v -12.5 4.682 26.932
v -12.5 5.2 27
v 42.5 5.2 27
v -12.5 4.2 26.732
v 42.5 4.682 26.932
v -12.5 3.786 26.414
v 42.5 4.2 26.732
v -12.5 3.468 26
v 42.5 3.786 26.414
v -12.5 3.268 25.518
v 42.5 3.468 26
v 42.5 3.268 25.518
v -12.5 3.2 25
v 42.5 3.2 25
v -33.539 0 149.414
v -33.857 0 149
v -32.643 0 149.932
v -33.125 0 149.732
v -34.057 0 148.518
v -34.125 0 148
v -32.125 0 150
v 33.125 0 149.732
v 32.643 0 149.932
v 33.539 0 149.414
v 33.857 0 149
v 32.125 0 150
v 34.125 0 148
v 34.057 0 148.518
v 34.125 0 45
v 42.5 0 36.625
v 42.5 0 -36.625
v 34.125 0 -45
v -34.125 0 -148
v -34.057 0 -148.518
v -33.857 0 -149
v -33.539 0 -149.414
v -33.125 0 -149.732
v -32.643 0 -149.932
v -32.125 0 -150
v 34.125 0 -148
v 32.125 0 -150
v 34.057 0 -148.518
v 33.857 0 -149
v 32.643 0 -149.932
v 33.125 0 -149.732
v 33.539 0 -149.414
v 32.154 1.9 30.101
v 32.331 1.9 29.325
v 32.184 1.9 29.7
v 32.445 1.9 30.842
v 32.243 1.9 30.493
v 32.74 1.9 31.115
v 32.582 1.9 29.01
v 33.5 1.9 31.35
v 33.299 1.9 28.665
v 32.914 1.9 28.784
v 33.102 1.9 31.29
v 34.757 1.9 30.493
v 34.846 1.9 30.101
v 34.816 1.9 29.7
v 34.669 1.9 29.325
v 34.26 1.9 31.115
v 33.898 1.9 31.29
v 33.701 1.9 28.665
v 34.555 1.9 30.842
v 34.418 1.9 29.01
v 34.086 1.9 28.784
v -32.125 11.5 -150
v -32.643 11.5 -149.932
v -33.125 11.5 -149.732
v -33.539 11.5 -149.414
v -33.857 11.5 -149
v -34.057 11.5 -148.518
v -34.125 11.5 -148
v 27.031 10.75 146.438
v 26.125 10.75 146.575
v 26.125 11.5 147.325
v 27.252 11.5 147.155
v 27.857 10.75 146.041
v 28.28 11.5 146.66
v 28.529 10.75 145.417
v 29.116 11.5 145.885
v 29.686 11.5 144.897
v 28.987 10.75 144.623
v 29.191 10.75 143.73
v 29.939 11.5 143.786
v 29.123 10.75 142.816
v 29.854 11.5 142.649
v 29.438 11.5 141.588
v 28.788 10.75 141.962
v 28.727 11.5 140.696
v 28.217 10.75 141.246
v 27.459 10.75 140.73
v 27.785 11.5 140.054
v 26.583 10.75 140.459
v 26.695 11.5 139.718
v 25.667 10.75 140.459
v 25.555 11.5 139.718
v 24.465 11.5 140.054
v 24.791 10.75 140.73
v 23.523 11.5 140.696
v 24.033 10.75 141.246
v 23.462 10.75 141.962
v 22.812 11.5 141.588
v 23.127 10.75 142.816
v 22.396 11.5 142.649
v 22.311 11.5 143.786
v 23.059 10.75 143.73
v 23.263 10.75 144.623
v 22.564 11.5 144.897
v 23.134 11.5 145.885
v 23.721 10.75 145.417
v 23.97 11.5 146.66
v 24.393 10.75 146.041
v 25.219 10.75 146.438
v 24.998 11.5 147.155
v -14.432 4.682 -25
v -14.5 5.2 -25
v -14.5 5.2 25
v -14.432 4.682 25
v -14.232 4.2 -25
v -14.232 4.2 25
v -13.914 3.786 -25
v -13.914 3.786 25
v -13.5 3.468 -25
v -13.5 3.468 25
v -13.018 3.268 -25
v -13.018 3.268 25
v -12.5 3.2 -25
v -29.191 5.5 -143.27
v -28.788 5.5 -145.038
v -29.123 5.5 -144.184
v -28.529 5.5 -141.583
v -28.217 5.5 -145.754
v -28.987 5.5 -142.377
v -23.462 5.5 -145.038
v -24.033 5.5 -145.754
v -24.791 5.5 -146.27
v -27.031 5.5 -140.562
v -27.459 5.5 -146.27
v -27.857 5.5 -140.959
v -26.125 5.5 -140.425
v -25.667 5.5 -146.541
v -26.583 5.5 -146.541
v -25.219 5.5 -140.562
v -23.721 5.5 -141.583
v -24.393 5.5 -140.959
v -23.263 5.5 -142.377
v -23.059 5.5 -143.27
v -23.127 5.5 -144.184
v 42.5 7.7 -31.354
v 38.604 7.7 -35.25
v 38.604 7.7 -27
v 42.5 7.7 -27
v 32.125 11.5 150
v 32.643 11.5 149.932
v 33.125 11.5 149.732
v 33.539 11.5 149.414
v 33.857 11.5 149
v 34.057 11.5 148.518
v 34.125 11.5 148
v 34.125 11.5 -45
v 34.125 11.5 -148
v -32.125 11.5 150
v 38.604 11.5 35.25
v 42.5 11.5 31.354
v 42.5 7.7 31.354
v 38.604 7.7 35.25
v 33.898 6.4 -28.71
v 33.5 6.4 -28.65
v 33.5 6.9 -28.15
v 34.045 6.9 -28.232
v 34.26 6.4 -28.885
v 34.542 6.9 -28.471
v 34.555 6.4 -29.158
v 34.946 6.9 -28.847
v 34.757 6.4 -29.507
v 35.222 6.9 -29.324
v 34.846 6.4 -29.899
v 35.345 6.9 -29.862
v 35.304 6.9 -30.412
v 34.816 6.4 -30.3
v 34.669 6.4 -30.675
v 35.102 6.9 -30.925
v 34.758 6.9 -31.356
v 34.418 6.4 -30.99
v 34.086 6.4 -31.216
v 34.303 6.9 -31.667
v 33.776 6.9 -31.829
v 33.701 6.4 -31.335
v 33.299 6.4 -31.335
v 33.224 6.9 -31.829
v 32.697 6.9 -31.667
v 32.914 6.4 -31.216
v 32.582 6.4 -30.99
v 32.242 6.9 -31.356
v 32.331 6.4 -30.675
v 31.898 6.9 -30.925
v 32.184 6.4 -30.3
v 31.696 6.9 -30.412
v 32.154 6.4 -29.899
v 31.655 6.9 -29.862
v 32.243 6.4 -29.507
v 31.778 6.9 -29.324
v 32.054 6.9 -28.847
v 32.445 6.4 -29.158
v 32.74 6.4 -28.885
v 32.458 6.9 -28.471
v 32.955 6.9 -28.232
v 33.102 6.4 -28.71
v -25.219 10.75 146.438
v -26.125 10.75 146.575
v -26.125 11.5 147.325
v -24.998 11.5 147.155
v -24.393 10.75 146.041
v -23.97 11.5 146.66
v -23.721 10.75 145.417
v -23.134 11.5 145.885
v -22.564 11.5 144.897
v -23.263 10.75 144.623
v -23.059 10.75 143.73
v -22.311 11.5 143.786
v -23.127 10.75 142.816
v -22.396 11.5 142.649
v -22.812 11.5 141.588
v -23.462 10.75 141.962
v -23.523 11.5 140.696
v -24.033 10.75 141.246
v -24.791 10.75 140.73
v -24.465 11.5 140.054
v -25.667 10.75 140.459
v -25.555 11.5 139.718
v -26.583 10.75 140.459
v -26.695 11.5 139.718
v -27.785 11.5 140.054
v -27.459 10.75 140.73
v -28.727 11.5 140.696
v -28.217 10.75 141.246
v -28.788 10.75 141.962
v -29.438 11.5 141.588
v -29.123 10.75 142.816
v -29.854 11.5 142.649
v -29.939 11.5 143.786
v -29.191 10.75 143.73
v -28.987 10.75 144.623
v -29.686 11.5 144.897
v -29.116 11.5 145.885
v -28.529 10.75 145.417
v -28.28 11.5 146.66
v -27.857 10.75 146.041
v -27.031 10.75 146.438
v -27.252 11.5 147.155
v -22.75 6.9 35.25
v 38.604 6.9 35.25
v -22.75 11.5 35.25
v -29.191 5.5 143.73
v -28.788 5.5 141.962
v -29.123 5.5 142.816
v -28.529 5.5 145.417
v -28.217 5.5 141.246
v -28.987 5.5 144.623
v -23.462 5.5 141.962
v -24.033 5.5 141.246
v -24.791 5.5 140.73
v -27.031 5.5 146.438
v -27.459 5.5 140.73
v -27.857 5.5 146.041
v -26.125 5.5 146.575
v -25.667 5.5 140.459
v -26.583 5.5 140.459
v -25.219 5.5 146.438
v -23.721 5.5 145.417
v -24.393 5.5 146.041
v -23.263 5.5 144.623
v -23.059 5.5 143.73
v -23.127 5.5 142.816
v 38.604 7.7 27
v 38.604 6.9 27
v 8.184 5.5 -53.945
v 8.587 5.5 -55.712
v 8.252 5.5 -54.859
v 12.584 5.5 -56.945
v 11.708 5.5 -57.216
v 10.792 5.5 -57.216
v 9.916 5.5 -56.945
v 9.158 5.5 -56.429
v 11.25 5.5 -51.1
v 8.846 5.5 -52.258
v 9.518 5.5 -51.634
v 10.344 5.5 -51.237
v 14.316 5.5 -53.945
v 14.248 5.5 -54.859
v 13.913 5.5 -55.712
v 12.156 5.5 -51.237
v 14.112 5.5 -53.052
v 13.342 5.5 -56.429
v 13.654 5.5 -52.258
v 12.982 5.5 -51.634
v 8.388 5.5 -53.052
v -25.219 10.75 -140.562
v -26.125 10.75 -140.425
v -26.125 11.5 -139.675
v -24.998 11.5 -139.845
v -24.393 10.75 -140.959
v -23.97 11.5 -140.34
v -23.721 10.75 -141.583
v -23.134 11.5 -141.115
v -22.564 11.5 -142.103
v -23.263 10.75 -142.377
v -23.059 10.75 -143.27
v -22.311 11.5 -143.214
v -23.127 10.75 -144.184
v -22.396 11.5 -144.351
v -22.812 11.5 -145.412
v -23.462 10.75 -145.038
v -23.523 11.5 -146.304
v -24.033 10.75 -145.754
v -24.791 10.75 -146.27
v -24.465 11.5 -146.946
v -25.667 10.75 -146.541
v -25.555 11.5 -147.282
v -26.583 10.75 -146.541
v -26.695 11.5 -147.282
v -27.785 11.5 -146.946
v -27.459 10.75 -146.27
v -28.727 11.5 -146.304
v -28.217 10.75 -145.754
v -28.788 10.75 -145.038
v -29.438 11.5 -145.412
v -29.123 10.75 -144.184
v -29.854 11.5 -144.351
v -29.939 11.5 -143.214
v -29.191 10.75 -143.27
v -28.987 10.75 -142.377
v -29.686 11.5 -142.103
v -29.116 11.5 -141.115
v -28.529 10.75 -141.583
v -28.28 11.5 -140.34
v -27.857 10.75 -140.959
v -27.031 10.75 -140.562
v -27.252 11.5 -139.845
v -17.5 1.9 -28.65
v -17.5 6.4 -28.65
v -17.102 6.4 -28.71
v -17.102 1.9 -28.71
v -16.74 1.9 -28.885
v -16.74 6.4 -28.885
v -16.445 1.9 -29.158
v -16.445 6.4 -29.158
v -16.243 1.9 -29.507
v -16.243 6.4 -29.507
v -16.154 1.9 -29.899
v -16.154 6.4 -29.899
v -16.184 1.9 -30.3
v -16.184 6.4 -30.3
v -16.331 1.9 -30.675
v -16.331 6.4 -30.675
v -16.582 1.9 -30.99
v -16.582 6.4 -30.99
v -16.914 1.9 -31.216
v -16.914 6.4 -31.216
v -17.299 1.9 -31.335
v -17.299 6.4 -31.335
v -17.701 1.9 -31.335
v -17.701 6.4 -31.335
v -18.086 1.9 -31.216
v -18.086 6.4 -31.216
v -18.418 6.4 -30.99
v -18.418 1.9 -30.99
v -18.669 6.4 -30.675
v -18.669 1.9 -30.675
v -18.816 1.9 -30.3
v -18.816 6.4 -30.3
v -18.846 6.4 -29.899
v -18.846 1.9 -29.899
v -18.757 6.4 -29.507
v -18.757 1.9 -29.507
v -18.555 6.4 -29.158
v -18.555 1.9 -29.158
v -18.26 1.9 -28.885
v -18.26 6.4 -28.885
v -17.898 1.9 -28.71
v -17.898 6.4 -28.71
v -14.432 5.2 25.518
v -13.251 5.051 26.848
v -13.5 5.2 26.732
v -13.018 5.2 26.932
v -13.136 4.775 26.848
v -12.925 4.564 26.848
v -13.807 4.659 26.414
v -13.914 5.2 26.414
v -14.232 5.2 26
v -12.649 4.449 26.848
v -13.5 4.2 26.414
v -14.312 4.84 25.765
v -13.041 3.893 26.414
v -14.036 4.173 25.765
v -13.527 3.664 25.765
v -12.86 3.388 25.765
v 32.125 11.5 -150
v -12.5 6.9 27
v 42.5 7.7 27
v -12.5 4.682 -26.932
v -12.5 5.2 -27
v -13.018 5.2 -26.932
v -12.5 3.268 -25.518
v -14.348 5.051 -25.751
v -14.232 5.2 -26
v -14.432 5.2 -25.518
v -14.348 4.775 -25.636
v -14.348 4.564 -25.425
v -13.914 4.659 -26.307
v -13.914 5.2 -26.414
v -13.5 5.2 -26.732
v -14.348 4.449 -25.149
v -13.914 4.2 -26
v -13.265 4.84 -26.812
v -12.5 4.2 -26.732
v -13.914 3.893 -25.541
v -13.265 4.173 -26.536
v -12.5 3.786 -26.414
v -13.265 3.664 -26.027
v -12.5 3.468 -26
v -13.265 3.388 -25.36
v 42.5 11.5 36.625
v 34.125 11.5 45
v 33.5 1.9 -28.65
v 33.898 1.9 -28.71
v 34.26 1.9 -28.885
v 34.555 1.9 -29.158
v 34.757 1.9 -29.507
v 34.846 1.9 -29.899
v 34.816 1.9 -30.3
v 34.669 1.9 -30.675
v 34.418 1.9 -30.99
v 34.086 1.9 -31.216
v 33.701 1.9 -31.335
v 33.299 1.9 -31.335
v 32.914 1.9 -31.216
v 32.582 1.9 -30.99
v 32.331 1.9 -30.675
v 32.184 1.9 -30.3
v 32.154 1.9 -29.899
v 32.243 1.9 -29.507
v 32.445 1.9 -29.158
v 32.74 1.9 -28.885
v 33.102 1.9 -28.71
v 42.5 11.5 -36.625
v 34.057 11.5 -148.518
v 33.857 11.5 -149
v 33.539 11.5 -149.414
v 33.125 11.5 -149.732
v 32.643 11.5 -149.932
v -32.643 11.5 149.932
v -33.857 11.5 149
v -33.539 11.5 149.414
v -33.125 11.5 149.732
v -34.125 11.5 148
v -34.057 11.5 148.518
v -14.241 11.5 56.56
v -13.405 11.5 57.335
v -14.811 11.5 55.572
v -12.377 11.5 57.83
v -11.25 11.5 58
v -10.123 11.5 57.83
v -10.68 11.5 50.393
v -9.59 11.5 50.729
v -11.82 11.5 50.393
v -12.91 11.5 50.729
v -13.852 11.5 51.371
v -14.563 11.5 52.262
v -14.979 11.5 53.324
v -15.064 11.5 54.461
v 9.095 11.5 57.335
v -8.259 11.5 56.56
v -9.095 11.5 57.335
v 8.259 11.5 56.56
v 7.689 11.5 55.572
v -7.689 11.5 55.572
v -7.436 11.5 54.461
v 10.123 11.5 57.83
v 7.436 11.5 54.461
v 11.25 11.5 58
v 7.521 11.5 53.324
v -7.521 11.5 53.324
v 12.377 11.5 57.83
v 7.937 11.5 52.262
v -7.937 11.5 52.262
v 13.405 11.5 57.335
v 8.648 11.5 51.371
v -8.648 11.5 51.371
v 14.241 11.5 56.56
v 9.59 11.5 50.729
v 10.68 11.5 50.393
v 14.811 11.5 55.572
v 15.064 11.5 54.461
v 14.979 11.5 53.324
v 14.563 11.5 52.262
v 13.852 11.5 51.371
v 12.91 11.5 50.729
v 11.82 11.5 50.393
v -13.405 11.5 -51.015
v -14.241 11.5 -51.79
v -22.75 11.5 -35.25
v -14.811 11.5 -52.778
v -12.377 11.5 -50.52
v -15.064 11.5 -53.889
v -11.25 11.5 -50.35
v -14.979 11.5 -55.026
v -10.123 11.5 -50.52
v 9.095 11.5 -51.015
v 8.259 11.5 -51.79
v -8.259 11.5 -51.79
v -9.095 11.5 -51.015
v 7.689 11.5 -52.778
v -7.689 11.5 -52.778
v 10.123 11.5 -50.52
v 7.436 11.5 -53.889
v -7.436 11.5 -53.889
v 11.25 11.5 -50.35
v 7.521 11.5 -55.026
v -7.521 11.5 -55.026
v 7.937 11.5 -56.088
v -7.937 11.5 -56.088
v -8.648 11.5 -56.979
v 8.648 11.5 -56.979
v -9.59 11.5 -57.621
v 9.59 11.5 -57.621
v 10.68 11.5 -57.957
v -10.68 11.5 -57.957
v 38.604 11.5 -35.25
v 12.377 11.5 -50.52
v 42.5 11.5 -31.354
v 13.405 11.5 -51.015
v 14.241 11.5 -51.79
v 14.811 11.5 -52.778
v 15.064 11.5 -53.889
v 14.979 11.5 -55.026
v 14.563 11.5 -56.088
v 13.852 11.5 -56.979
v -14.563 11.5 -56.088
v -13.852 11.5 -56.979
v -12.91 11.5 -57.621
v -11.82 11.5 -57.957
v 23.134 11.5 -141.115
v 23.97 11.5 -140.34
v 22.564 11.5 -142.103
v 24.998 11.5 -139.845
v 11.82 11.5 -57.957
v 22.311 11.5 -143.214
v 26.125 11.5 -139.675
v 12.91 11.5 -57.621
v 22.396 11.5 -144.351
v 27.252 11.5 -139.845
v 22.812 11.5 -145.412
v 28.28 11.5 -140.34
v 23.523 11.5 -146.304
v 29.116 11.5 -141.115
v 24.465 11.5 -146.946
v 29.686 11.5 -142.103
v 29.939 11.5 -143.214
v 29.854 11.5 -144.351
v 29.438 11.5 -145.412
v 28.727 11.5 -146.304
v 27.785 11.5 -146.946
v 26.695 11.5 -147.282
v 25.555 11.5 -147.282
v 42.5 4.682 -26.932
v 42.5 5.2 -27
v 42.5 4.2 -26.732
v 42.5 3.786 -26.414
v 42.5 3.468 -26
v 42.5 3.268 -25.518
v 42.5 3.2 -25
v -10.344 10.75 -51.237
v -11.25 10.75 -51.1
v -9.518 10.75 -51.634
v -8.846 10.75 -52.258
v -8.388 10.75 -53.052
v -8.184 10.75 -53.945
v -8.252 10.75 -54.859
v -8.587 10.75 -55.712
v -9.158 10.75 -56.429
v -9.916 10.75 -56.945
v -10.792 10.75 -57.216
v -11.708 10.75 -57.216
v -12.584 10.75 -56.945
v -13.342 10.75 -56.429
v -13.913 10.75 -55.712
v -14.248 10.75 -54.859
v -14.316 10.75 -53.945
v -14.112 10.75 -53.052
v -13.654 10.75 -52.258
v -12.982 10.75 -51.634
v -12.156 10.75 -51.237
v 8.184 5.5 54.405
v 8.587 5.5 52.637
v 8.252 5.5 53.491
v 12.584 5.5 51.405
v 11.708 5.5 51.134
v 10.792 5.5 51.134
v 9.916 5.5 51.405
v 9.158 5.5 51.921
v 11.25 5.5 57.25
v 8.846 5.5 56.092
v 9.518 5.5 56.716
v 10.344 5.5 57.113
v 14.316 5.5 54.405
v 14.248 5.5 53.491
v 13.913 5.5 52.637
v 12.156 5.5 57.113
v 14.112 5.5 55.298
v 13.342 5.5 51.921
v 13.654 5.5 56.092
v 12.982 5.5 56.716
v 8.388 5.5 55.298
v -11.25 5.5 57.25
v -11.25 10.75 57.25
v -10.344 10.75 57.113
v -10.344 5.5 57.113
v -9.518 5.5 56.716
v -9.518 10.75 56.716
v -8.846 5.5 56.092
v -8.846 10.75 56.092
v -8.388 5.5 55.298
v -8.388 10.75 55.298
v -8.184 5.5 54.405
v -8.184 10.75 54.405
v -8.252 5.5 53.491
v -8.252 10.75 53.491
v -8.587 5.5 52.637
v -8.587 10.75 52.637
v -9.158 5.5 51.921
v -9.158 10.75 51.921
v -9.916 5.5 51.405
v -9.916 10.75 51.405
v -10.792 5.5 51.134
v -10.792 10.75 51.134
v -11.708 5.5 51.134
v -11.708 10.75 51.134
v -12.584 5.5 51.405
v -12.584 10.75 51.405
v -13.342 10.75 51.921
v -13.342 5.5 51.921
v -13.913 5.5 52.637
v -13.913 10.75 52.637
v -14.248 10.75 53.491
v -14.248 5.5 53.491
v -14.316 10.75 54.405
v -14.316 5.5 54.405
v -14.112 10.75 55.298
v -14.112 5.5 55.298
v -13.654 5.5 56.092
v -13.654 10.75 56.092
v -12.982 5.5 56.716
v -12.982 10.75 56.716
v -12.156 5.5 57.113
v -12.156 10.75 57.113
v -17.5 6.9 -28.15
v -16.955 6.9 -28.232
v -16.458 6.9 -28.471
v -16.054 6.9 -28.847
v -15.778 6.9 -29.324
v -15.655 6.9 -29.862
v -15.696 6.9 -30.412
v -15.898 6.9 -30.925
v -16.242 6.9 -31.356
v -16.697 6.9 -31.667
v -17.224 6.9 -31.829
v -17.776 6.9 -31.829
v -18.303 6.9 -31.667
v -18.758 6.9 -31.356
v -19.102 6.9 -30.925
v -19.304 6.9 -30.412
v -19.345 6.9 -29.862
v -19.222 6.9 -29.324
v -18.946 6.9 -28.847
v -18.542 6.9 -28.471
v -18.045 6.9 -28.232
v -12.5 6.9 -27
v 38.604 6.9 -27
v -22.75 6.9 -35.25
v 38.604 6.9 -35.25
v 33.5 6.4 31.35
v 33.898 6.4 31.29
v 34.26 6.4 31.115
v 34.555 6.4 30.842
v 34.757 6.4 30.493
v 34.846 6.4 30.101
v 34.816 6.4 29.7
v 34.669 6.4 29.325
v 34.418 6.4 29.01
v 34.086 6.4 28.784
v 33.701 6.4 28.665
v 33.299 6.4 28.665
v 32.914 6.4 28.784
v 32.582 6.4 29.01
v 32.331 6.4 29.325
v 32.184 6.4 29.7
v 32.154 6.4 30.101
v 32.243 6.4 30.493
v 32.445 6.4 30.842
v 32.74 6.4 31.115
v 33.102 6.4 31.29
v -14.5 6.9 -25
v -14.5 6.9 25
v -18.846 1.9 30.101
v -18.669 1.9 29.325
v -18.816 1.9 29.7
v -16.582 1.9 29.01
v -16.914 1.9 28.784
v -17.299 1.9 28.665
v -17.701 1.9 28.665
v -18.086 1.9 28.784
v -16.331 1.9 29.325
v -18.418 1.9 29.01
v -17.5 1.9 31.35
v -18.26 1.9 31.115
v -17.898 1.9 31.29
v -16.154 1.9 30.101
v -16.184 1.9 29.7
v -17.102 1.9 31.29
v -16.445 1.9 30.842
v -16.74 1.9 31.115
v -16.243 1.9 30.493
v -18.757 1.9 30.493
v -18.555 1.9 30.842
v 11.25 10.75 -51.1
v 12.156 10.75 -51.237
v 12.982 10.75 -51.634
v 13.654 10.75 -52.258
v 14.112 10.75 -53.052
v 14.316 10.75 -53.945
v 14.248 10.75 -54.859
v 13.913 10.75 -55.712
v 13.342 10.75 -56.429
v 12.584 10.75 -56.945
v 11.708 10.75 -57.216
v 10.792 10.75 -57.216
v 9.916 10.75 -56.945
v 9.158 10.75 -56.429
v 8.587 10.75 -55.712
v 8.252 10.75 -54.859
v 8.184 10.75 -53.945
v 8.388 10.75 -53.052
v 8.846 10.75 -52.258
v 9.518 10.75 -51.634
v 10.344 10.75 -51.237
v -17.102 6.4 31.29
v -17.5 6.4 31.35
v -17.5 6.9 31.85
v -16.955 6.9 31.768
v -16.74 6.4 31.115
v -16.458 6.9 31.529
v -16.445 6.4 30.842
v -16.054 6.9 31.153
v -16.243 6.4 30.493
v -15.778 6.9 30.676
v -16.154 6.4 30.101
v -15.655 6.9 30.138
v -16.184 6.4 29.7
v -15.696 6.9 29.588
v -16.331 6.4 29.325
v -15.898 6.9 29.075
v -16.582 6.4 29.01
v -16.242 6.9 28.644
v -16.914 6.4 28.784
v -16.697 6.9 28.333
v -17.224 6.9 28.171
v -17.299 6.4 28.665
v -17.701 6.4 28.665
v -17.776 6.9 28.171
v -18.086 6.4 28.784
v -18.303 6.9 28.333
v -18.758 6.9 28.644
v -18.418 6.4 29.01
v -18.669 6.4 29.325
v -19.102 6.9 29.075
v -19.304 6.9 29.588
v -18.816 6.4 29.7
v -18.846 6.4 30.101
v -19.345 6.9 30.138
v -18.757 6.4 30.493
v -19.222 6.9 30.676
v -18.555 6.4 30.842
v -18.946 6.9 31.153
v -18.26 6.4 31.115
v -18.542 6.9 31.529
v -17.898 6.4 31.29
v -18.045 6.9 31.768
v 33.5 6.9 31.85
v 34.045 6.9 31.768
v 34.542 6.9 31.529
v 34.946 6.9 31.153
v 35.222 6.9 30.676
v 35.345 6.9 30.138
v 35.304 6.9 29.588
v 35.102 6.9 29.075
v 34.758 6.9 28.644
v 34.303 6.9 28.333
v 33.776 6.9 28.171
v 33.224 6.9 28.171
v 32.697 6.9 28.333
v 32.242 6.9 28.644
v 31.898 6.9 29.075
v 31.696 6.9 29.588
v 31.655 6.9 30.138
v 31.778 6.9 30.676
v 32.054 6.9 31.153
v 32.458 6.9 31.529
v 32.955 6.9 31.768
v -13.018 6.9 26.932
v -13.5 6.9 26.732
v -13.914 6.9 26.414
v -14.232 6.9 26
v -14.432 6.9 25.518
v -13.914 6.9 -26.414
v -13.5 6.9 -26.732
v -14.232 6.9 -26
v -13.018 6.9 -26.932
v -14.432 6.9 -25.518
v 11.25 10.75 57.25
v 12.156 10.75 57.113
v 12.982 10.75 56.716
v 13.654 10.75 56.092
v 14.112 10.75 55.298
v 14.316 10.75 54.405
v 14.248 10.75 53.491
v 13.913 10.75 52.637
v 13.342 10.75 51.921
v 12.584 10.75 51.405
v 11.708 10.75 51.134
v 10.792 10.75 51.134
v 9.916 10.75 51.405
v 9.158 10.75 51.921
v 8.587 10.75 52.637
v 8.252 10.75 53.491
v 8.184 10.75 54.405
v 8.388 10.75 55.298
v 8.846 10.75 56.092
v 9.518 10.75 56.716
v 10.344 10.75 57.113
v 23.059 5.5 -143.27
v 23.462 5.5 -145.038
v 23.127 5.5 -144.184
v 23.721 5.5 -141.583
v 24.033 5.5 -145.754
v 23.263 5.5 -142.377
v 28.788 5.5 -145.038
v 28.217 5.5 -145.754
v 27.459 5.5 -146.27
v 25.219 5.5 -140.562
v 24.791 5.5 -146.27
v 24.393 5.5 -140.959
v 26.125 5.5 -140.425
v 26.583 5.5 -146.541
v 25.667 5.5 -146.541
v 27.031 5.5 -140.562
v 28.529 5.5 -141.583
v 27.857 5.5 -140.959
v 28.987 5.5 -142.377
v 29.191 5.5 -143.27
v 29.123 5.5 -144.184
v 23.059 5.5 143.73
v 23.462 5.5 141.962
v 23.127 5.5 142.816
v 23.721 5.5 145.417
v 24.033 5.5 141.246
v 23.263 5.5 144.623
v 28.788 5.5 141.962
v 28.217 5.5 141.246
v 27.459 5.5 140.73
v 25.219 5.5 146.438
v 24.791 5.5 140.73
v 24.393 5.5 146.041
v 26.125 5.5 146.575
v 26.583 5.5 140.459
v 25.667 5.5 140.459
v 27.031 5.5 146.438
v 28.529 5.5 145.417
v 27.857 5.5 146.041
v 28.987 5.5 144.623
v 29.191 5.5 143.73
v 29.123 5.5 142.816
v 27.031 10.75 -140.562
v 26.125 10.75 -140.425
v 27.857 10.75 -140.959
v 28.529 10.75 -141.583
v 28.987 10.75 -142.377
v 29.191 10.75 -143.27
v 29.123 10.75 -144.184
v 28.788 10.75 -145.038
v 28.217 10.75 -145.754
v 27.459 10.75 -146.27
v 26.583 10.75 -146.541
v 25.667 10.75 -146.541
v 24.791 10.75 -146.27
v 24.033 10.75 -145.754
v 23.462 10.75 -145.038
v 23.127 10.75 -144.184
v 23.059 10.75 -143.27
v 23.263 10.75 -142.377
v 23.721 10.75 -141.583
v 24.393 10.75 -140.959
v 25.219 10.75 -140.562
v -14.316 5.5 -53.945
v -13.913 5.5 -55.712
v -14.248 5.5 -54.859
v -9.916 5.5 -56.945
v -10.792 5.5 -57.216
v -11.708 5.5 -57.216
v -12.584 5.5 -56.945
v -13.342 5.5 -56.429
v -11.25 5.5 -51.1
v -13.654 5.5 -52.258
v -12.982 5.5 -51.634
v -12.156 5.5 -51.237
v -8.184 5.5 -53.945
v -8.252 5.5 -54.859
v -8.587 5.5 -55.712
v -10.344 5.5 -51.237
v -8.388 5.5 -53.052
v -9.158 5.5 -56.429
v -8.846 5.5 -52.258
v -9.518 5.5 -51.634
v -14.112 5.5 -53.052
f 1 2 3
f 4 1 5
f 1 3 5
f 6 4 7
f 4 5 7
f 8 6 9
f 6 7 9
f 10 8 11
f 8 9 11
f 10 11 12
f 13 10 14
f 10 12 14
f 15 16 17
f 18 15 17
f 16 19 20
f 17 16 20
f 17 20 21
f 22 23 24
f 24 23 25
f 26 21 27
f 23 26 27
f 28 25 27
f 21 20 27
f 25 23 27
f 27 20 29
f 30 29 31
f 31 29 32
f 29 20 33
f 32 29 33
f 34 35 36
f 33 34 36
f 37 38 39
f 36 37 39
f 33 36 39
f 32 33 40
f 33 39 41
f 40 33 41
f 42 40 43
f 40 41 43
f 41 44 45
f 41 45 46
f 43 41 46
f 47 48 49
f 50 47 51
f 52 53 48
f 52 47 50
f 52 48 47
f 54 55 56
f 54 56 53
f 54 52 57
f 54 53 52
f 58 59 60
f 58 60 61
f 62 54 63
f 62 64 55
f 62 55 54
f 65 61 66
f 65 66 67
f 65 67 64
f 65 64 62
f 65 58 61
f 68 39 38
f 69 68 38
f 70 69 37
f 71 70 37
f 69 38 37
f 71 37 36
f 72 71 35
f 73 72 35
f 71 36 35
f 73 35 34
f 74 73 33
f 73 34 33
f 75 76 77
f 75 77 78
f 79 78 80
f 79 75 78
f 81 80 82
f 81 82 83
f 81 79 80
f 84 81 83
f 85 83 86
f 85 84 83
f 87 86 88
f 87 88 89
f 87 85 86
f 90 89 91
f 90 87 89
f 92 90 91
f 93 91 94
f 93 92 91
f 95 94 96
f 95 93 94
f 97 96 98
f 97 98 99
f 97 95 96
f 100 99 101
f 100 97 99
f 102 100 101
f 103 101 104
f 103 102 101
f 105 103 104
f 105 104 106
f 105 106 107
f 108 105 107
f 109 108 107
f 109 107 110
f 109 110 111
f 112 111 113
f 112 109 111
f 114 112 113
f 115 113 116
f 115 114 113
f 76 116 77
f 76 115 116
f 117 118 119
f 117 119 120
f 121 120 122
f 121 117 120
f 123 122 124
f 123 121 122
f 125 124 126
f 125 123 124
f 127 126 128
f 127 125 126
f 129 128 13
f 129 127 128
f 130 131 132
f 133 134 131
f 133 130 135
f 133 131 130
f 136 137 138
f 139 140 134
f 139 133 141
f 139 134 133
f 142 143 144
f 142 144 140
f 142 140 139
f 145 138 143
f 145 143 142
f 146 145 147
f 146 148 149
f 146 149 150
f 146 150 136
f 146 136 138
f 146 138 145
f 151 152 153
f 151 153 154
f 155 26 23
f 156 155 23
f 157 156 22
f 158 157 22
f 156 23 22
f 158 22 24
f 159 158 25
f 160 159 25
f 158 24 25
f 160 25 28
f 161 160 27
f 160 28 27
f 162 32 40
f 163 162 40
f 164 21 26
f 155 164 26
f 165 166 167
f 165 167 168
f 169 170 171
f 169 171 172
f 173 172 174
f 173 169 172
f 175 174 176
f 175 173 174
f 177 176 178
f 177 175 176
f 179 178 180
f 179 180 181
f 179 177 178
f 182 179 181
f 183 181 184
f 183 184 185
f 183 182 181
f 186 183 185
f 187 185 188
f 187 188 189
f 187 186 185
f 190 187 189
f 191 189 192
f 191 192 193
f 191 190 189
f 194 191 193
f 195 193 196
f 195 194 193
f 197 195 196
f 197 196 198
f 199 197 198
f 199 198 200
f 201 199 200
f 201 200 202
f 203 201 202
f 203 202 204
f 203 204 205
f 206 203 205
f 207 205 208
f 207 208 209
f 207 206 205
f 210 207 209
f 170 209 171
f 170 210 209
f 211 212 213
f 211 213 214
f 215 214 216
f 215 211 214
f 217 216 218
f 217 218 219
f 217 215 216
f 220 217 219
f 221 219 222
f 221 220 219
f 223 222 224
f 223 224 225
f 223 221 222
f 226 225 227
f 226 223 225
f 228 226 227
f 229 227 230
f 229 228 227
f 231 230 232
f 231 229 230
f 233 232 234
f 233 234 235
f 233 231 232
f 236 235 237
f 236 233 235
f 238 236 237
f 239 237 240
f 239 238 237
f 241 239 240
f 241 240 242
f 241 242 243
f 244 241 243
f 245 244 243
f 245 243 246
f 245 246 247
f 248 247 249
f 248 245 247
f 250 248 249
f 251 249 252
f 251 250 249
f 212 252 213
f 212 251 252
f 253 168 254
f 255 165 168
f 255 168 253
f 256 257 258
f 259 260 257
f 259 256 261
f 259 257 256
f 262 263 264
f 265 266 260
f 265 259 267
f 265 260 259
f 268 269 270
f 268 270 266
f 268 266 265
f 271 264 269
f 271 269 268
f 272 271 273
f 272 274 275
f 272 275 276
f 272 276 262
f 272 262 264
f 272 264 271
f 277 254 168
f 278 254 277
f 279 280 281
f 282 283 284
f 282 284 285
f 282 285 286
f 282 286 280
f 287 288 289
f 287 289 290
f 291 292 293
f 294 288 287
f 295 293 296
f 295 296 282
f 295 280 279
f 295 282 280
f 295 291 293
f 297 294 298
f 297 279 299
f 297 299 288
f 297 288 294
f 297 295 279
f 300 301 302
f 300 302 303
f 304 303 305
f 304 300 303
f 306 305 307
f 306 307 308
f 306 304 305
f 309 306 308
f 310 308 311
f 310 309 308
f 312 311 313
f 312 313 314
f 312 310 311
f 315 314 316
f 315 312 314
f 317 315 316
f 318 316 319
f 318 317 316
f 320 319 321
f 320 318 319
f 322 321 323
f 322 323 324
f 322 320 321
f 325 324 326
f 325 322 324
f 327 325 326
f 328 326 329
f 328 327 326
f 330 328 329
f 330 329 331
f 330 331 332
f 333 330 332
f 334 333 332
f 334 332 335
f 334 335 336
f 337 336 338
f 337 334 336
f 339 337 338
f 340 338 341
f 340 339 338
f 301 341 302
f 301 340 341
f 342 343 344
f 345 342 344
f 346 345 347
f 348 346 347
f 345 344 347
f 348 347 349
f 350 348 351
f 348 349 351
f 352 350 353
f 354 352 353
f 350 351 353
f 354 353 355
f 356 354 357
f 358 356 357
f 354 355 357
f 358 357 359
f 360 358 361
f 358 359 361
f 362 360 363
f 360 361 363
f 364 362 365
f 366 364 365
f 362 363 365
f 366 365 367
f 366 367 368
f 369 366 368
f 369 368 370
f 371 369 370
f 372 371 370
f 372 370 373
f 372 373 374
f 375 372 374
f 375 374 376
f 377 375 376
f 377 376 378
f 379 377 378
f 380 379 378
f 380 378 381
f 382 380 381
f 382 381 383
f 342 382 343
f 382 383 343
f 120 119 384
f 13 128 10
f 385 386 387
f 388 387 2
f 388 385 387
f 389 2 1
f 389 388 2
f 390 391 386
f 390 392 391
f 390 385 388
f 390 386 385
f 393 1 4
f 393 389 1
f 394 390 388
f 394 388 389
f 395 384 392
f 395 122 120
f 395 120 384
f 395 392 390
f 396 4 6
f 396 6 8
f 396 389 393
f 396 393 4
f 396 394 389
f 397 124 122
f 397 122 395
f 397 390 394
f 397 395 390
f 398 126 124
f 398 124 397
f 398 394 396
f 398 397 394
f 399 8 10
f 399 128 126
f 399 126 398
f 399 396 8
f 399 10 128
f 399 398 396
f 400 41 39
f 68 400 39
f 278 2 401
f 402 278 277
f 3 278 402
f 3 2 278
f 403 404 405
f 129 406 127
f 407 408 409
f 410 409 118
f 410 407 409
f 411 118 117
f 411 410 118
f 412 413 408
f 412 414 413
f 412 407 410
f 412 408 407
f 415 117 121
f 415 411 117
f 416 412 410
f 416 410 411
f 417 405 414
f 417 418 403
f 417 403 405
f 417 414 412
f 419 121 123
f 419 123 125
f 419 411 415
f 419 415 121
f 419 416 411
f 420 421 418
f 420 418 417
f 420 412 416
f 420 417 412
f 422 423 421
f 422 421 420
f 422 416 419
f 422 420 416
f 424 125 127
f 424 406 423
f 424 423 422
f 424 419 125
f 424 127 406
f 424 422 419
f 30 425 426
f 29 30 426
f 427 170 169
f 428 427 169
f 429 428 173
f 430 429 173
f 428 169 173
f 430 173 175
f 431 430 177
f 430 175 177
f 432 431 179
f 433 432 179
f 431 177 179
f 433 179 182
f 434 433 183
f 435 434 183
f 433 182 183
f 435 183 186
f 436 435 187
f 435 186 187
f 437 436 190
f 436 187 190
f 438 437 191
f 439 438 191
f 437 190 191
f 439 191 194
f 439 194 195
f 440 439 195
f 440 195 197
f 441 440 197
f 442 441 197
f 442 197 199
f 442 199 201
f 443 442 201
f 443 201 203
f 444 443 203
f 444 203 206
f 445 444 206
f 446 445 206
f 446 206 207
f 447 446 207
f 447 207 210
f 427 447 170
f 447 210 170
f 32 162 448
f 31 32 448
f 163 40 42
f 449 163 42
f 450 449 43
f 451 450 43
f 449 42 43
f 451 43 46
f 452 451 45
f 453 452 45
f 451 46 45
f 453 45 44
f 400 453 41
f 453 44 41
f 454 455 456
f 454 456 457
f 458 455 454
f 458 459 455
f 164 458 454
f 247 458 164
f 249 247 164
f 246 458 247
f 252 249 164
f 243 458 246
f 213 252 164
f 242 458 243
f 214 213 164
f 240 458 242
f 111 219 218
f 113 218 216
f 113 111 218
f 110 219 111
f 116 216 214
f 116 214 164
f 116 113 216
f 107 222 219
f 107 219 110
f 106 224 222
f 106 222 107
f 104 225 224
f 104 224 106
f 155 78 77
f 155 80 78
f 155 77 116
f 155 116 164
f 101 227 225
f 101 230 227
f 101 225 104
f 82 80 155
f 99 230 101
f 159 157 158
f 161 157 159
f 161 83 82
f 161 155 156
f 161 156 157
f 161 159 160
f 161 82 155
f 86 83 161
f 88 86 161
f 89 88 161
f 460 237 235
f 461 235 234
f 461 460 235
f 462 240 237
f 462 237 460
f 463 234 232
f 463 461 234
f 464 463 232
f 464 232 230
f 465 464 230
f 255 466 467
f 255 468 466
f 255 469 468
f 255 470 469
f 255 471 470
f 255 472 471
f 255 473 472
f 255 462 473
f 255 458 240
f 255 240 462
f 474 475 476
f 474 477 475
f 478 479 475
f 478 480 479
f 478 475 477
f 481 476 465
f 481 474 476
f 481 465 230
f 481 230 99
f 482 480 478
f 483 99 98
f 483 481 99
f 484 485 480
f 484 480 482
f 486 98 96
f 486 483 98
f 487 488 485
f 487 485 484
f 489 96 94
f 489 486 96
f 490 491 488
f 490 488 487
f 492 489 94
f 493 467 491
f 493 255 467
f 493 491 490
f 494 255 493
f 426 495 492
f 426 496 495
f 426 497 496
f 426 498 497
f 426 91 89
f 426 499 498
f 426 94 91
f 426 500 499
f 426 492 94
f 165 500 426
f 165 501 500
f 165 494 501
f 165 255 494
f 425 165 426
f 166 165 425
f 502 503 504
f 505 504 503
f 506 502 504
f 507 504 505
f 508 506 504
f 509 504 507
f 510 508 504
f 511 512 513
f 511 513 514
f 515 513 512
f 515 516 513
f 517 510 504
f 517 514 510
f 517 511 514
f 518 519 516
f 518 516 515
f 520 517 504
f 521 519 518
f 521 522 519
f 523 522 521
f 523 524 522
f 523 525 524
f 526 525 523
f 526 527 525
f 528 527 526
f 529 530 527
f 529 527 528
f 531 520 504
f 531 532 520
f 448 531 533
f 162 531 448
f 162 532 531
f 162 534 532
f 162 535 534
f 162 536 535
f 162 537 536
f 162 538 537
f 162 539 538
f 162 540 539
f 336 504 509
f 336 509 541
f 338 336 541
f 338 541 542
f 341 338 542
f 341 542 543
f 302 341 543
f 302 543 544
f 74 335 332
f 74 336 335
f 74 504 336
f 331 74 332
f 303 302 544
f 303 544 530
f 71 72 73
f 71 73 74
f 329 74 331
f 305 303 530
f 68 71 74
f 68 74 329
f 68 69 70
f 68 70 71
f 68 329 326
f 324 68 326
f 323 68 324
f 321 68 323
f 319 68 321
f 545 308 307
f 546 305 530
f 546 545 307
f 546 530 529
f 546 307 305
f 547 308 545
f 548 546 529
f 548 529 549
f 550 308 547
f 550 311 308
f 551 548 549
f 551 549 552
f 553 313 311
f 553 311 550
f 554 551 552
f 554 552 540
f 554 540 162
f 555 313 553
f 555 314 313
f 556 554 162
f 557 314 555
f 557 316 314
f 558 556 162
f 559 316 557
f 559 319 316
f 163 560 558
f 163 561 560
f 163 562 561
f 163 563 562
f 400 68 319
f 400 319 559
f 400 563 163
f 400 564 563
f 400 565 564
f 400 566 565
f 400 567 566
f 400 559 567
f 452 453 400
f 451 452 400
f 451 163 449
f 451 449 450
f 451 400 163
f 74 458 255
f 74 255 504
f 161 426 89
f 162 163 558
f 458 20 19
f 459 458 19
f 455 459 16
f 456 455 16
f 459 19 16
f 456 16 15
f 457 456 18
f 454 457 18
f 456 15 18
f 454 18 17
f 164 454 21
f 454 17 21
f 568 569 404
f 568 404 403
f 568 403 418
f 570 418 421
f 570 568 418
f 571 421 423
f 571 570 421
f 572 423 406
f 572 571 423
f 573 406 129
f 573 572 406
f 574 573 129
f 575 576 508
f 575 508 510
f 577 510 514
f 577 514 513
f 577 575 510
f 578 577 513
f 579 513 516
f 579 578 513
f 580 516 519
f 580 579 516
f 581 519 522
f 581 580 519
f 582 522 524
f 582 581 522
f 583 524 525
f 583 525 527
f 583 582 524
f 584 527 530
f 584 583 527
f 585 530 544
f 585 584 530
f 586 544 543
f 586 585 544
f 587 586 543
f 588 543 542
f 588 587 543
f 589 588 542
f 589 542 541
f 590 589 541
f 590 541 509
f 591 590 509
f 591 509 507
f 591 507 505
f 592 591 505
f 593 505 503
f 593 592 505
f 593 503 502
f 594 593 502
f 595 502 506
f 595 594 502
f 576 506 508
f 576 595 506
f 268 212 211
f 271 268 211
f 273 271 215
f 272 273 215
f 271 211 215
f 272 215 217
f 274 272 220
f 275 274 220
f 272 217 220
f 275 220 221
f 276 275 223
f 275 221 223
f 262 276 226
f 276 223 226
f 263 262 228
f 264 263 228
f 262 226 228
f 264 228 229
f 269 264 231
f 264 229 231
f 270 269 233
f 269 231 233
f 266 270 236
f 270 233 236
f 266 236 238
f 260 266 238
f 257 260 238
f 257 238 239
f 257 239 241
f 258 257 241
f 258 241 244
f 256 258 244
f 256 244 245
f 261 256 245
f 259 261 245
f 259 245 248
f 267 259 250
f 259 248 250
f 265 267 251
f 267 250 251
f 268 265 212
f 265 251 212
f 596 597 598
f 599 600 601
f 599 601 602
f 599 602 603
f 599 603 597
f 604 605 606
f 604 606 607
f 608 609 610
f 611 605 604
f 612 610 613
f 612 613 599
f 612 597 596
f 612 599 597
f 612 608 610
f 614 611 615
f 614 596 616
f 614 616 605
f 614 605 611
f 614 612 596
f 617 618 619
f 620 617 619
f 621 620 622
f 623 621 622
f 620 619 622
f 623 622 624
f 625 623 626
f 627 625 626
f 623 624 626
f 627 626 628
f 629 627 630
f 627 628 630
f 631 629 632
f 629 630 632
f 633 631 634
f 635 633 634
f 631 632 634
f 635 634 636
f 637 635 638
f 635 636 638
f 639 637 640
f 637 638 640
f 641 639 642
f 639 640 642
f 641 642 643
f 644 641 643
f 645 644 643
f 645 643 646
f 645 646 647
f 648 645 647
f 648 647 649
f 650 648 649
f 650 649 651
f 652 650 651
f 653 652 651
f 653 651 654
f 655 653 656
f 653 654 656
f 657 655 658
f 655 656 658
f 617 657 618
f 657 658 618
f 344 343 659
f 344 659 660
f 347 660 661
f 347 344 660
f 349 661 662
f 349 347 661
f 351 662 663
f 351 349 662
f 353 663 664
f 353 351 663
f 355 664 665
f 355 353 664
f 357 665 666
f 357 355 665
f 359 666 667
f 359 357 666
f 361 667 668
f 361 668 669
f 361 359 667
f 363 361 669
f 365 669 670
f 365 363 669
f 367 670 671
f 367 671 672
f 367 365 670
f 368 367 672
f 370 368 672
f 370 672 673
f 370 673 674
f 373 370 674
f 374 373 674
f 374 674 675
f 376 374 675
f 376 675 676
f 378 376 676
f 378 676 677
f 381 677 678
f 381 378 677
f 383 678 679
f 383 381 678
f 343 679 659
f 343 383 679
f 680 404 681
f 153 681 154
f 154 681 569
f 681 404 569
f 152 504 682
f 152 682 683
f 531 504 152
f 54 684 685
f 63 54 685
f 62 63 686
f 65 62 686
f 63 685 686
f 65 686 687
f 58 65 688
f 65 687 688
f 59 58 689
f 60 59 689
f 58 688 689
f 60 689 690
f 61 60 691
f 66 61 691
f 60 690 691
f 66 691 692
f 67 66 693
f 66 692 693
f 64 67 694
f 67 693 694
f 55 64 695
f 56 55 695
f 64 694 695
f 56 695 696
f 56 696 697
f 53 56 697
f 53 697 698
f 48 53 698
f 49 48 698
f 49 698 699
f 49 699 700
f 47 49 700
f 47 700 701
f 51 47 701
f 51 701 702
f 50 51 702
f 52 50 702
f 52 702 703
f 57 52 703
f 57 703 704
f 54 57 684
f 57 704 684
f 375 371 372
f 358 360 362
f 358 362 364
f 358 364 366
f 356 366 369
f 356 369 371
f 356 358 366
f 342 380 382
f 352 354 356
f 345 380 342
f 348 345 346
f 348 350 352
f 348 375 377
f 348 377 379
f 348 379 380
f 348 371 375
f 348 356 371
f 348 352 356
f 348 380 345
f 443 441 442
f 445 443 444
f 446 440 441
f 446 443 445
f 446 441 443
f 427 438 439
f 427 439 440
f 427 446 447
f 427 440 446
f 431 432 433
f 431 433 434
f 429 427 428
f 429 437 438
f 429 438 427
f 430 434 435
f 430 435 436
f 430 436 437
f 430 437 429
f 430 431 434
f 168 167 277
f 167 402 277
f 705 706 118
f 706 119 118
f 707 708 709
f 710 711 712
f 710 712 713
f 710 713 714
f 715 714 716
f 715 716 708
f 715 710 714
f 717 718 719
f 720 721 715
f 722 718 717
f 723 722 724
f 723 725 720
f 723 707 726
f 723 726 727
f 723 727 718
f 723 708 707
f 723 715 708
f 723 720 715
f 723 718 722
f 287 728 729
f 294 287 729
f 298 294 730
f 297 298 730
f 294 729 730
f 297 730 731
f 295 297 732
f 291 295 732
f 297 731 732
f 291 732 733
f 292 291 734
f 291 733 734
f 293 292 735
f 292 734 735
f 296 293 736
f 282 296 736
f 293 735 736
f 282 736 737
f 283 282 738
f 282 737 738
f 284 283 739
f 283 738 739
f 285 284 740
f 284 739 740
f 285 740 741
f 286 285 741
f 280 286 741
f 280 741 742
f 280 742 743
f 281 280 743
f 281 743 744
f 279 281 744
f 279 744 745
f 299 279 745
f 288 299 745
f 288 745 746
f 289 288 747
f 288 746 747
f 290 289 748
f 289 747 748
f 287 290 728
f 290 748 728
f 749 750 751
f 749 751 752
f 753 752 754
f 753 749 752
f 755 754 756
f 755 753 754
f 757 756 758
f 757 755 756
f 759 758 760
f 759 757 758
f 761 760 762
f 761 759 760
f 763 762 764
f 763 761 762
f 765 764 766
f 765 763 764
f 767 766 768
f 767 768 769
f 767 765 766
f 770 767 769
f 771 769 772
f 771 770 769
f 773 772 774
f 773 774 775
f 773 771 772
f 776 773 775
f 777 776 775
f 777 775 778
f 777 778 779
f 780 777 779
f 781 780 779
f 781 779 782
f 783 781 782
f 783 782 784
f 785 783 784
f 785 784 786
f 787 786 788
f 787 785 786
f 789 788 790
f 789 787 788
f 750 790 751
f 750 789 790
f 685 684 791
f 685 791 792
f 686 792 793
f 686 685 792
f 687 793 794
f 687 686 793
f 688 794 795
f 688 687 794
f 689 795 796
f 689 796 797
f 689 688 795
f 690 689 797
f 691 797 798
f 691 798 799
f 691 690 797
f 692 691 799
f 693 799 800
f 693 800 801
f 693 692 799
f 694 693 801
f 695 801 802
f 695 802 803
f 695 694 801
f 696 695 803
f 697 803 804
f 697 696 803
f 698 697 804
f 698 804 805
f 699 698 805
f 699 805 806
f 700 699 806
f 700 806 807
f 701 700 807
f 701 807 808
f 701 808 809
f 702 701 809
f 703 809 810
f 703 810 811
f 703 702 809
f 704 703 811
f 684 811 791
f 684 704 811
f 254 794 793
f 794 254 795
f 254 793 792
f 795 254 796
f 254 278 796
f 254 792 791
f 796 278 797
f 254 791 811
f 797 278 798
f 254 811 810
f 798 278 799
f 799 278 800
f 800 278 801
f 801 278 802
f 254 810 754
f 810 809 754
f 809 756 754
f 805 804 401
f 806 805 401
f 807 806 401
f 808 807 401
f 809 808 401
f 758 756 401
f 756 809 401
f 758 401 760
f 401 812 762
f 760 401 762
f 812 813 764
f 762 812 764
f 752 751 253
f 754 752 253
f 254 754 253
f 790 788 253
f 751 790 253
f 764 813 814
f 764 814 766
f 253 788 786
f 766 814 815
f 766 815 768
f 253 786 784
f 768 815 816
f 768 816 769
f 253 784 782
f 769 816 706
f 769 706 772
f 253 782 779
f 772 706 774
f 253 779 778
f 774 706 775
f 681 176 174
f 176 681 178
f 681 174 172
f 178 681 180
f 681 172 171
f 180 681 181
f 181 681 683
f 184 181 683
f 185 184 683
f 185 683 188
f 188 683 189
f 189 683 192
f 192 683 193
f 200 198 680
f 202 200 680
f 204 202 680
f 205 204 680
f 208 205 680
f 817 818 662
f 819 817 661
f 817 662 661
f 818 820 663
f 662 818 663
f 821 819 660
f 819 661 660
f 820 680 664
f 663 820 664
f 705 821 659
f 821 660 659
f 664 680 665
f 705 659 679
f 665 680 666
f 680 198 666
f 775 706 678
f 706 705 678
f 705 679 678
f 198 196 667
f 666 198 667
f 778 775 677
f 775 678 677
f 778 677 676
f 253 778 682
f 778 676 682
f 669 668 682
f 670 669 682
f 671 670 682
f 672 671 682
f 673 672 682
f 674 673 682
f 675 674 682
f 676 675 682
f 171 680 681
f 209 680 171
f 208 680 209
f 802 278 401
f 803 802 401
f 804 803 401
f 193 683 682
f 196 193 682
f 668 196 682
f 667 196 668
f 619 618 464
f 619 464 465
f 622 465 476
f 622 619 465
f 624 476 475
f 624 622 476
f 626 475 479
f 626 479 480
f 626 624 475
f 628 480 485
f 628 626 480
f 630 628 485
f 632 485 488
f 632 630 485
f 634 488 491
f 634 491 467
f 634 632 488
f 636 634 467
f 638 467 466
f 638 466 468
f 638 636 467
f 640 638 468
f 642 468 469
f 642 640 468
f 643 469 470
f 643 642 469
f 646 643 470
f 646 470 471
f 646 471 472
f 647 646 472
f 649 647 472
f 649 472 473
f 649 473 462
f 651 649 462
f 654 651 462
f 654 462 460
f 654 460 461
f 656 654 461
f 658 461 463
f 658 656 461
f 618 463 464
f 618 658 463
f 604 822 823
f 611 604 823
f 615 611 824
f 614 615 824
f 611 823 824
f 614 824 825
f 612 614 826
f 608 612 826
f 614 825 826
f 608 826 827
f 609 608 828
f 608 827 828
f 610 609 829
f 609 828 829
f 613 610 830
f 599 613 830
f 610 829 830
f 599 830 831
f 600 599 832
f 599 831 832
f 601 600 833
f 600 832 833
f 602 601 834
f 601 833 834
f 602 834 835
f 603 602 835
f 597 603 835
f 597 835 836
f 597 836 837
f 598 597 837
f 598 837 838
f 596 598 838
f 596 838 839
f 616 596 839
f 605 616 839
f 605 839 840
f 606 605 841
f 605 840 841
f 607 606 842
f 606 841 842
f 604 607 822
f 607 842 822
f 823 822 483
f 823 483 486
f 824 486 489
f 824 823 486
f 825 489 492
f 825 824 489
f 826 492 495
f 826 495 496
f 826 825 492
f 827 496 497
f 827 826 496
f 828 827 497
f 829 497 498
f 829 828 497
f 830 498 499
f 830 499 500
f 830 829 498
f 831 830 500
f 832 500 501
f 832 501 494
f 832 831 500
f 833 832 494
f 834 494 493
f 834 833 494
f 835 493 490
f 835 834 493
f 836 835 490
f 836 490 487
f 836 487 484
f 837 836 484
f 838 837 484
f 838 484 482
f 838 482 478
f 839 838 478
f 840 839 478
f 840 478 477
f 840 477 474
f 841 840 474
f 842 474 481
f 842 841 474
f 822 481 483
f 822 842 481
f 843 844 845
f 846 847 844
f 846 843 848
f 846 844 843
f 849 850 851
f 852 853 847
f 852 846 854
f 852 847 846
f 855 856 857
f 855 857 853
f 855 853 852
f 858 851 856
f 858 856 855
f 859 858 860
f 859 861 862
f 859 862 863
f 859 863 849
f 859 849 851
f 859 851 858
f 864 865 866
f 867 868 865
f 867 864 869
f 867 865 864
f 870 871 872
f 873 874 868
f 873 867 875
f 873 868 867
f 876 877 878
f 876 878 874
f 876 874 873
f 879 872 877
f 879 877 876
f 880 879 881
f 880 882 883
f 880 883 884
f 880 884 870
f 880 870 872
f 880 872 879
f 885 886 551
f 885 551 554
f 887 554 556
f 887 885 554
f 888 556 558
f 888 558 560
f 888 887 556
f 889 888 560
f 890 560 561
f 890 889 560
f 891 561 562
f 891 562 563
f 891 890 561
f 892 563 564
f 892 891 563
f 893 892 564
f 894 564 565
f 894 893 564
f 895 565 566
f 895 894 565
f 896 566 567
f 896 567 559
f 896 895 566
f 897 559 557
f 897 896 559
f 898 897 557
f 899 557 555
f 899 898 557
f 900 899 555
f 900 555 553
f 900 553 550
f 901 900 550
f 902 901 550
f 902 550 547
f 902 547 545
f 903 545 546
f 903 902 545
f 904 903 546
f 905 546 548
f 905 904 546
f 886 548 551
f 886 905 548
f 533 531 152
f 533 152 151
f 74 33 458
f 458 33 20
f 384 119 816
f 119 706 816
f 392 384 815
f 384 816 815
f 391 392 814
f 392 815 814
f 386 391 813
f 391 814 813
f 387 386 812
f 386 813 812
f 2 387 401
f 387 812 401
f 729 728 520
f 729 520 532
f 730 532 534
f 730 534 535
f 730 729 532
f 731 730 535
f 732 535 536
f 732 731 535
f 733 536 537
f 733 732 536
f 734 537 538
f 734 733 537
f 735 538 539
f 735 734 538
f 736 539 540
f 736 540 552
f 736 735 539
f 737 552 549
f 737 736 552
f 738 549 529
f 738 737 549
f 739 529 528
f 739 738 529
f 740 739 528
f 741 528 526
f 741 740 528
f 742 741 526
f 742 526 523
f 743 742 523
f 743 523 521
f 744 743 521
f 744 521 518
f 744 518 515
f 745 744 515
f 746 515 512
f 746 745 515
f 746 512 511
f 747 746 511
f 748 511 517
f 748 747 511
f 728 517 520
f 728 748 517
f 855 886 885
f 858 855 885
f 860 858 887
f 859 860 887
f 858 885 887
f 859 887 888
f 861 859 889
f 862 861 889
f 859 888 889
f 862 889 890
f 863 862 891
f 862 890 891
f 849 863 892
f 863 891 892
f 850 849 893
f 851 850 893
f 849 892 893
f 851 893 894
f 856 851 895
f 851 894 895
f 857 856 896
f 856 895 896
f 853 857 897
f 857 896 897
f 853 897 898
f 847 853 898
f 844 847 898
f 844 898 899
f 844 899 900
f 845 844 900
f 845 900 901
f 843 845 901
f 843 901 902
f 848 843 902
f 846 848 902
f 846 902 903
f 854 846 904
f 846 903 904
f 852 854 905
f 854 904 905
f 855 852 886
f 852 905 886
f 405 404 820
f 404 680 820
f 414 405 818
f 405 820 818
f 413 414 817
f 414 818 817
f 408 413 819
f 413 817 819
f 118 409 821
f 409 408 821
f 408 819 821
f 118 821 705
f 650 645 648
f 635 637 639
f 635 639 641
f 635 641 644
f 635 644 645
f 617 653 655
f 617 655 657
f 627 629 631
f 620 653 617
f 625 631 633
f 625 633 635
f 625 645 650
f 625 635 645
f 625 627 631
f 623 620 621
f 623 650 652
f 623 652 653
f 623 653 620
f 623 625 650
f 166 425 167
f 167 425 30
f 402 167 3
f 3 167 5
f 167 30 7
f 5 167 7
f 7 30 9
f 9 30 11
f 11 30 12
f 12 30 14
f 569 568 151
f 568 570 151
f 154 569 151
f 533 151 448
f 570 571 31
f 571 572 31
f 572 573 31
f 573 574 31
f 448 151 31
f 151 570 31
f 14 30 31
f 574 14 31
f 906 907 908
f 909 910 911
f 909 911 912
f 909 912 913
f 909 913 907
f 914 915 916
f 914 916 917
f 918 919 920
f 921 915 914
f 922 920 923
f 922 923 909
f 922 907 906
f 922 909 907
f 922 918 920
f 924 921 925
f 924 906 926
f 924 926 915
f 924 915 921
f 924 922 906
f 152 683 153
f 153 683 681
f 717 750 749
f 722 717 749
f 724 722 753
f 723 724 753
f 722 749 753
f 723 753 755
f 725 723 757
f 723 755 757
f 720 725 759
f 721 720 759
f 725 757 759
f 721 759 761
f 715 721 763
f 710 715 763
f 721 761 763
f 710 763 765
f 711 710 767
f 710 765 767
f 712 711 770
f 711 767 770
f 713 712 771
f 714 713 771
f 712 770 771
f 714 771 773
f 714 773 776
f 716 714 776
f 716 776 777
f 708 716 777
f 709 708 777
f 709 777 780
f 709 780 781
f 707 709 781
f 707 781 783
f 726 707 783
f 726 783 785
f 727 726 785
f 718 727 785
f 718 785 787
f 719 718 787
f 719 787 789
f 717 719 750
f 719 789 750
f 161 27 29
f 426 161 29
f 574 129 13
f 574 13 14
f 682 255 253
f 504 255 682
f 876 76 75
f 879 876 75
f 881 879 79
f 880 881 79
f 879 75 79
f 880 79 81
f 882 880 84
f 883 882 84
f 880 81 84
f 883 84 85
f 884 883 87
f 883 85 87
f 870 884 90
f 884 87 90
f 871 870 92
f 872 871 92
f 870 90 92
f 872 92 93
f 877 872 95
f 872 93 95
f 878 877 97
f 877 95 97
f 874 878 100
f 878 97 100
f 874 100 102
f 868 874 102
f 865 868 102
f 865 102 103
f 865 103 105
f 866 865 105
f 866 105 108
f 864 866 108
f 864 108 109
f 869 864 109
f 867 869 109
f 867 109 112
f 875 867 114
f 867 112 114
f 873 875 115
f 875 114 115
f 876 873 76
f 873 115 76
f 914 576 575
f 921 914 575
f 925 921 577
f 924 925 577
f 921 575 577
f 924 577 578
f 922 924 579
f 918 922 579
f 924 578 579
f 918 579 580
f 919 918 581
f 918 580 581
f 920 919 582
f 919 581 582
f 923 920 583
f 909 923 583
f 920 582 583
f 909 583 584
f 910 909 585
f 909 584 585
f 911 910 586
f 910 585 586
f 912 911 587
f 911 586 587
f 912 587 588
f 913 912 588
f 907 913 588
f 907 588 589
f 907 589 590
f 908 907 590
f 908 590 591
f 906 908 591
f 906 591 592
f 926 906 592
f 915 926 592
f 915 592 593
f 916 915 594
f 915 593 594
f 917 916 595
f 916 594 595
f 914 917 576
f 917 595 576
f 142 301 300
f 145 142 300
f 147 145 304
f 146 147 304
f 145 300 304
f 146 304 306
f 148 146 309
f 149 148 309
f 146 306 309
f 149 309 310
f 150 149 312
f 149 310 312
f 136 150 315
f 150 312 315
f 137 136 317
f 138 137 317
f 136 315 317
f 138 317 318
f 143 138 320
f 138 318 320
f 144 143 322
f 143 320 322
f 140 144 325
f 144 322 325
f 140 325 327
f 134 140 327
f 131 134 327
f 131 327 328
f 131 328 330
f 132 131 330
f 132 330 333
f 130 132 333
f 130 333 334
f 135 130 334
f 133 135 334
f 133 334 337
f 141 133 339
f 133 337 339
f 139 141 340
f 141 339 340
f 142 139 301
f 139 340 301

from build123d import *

# Parameters (mm, degrees)
BOSS_EXTRUDE1_DEPTH     = 11.5
SKETCH4_R               = 3.075
CUT_EXTRUDE1_DEPTH      = 6
BOSS_EXTRUDE3_DEPTH     = 11.5
CUT_EXTRUDE6_DEPTH      = 4.6
CUT_EXTRUDE3_DEPTH      = 157.057233091
CUT_EXTRUDE3_DEPTH_BACK = 3.7
SKETCH24_W              = 57
SKETCH24_H              = 54
SKETCH25_R              = 1.35
CUT_EXTRUDE4_DEPTH      = 5
CHAMFER4_SIZE           = 0.5
FILLET1_R               = 2
BOSS_EXTRUDE2_DEPTH     = 0.8
CHAMFER5_SIZE           = 0.75


with BuildPart() as part:
    # Sketch1 → Boss-Extrude1 (new body)
    with BuildSketch(Plane(origin=(0, 0, 0), x_dir=(1, 0, 0), z_dir=(0, 1, 0))):
        with BuildLine():
            Line((-34.125, 135), (-34.125, -135))
            Line((-34.125, -135), (-34.125, -148))
            ThreePointArc((-34.125, -148), (-33.539213562, -149.414213562), (-32.125, -150))
            Line((-32.125, -150), (32.125, -150))
            ThreePointArc((32.125, -150), (33.539213562, -149.414213562), (34.125, -148))
            Line((34.125, -148), (34.125, -135))
            Line((34.125, -135), (34.125, 135))
            Line((34.125, 135), (34.125, 148))
            ThreePointArc((34.125, 148), (33.539213562, 149.414213562), (32.125, 150))
            Line((32.125, 150), (-32.125, 150))
            ThreePointArc((-32.125, 150), (-33.539213562, 149.414213562), (-34.125, 148))
            Line((-34.125, 148), (-34.125, 135))
        make_face()
    extrude(amount=BOSS_EXTRUDE1_DEPTH)

    # Sketch4 → Cut-Extrude1 (cut)
    with BuildSketch(Plane(origin=(0, 11.5, 0), x_dir=(1, 0, 0), z_dir=(0, 1, 0))):
        with Locations(Location((-26.125, -143.5, 0), (0, 0, 270))):
            Circle(SKETCH4_R)
        with Locations(Location((26.125, -143.5, 0), (0, 0, 270))):
            Circle(SKETCH4_R)
        with Locations(Location((26.125, 143.5, 0), (0, 0, 270))):
            Circle(SKETCH4_R)
        with Locations(Location((-26.125, 143.5, 0), (0, 0, 270))):
            Circle(SKETCH4_R)
        with Locations(Location((-11.25, -54.175, 0), (0, 0, 270))):
            Circle(SKETCH4_R)
        with Locations(Location((11.25, -54.175, 0), (0, 0, 270))):
            Circle(SKETCH4_R)
        with Locations(Location((11.25, 54.175, 0), (0, 0, 270))):
            Circle(SKETCH4_R)
        with Locations(Location((-11.25, 54.175, 0), (0, 0, 270))):
            Circle(SKETCH4_R)
    extrude(amount=-CUT_EXTRUDE1_DEPTH, mode=Mode.SUBTRACT)

    # Sketch27 → Boss-Extrude3 (add)
    with BuildSketch(Plane(origin=(0, 11.5, 0), x_dir=(1, 0, 0), z_dir=(0, 1, 0))):
        Polygon((34.125, 45), (42.5, 36.625), (42.5, -36.625), (34.125, -45), align=None)
    extrude(amount=-BOSS_EXTRUDE3_DEPTH)

    # Sketch21 → Cut-Extrude6 (cut)
    with BuildSketch(Plane(origin=(0, 11.5, 0), x_dir=(1, 0, 0), z_dir=(0, 1, 0))):
        Polygon((42.5, 31.353553391), (42.5, -31.353553391), (38.603553391, -35.25), (-22.75, -35.25), (-22.75, 35.25), (38.603553391, 35.25), align=None)
    extrude(amount=-CUT_EXTRUDE6_DEPTH, mode=Mode.SUBTRACT)

    # Sketch24 → Cut-Extrude3 (cut, two sides: drawn at the far end of the back side and taken through both)
    with BuildSketch(Plane(origin=(0, 6.9, 0), x_dir=(1, 0, 0), z_dir=(0, 1, 0)).offset(-CUT_EXTRUDE3_DEPTH_BACK)):
        with Locations((14, 0)):
            Rectangle(SKETCH24_W, SKETCH24_H)
    extrude(amount=CUT_EXTRUDE3_DEPTH + CUT_EXTRUDE3_DEPTH_BACK, mode=Mode.SUBTRACT)

    # Sketch25 → Cut-Extrude4 (cut)
    with BuildSketch(Plane(origin=(0, 6.9, 0), x_dir=(1, 0, 0), z_dir=(0, 1, 0))):
        with Locations(Location((33.5, 30, 0), (0, 0, 270))):
            Circle(SKETCH25_R)
        with Locations(Location((-17.5, 30, 0), (0, 0, 270))):
            Circle(SKETCH25_R)
        with Locations(Location((33.5, -30, 0), (0, 0, 270))):
            Circle(SKETCH25_R)
        with Locations(Location((-17.5, -30, 0), (0, 0, 270))):
            Circle(SKETCH25_R)
    extrude(amount=-CUT_EXTRUDE4_DEPTH, mode=Mode.SUBTRACT)

    # Chamfer4
    chamfer4_edges = [part.edges().sort_by_distance(p)[0] for p in [
        (-17.5, 6.9, -31.35),
        (33.5, 6.9, 28.65),
        (-17.5, 6.9, 28.65),
        (33.5, 6.9, -31.35),
    ]]
    chamfer(chamfer4_edges, length=CHAMFER4_SIZE)

    # Fillet1
    fillet1_edges = [part.edges().sort_by_distance(p)[0] for p in [
        (14, 3.2, -27),
        (-14.5, 5.05, -27),
        (-14.5, 3.2, 0),
        (-14.5, 5.05, 27),
        (14, 3.2, 27),
    ]]
    fillet(fillet1_edges, radius=FILLET1_R)

    # Sketch26 → Boss-Extrude2 (add)
    with BuildSketch(Plane(origin=(0, 6.9, 0), x_dir=(1, 0, 0), z_dir=(0, 1, 0))):
        Polygon((38.603553391, 35.25), (38.603553391, 27), (42.5, 27), (42.5, 31.353553391), align=None)
        Polygon((42.5, -31.353553391), (38.603553391, -35.25), (38.603553391, -27), (42.5, -27), align=None)
    extrude(amount=BOSS_EXTRUDE2_DEPTH)

    # Chamfer5
    chamfer5_edges = [part.edges().sort_by_distance(p)[0] for p in [
        (26.125, 11.5, 140.425),
        (26.125, 11.5, -146.575),
        (-11.25, 11.5, 51.1),
        (11.25, 11.5, 51.1),
        (-11.25, 11.5, -57.25),
        (11.25, 11.5, -57.25),
        (-26.125, 11.5, -146.575),
        (-26.125, 11.5, 140.425),
    ]]
    chamfer(chamfer5_edges, length=CHAMFER5_SIZE)


solid = part.part
